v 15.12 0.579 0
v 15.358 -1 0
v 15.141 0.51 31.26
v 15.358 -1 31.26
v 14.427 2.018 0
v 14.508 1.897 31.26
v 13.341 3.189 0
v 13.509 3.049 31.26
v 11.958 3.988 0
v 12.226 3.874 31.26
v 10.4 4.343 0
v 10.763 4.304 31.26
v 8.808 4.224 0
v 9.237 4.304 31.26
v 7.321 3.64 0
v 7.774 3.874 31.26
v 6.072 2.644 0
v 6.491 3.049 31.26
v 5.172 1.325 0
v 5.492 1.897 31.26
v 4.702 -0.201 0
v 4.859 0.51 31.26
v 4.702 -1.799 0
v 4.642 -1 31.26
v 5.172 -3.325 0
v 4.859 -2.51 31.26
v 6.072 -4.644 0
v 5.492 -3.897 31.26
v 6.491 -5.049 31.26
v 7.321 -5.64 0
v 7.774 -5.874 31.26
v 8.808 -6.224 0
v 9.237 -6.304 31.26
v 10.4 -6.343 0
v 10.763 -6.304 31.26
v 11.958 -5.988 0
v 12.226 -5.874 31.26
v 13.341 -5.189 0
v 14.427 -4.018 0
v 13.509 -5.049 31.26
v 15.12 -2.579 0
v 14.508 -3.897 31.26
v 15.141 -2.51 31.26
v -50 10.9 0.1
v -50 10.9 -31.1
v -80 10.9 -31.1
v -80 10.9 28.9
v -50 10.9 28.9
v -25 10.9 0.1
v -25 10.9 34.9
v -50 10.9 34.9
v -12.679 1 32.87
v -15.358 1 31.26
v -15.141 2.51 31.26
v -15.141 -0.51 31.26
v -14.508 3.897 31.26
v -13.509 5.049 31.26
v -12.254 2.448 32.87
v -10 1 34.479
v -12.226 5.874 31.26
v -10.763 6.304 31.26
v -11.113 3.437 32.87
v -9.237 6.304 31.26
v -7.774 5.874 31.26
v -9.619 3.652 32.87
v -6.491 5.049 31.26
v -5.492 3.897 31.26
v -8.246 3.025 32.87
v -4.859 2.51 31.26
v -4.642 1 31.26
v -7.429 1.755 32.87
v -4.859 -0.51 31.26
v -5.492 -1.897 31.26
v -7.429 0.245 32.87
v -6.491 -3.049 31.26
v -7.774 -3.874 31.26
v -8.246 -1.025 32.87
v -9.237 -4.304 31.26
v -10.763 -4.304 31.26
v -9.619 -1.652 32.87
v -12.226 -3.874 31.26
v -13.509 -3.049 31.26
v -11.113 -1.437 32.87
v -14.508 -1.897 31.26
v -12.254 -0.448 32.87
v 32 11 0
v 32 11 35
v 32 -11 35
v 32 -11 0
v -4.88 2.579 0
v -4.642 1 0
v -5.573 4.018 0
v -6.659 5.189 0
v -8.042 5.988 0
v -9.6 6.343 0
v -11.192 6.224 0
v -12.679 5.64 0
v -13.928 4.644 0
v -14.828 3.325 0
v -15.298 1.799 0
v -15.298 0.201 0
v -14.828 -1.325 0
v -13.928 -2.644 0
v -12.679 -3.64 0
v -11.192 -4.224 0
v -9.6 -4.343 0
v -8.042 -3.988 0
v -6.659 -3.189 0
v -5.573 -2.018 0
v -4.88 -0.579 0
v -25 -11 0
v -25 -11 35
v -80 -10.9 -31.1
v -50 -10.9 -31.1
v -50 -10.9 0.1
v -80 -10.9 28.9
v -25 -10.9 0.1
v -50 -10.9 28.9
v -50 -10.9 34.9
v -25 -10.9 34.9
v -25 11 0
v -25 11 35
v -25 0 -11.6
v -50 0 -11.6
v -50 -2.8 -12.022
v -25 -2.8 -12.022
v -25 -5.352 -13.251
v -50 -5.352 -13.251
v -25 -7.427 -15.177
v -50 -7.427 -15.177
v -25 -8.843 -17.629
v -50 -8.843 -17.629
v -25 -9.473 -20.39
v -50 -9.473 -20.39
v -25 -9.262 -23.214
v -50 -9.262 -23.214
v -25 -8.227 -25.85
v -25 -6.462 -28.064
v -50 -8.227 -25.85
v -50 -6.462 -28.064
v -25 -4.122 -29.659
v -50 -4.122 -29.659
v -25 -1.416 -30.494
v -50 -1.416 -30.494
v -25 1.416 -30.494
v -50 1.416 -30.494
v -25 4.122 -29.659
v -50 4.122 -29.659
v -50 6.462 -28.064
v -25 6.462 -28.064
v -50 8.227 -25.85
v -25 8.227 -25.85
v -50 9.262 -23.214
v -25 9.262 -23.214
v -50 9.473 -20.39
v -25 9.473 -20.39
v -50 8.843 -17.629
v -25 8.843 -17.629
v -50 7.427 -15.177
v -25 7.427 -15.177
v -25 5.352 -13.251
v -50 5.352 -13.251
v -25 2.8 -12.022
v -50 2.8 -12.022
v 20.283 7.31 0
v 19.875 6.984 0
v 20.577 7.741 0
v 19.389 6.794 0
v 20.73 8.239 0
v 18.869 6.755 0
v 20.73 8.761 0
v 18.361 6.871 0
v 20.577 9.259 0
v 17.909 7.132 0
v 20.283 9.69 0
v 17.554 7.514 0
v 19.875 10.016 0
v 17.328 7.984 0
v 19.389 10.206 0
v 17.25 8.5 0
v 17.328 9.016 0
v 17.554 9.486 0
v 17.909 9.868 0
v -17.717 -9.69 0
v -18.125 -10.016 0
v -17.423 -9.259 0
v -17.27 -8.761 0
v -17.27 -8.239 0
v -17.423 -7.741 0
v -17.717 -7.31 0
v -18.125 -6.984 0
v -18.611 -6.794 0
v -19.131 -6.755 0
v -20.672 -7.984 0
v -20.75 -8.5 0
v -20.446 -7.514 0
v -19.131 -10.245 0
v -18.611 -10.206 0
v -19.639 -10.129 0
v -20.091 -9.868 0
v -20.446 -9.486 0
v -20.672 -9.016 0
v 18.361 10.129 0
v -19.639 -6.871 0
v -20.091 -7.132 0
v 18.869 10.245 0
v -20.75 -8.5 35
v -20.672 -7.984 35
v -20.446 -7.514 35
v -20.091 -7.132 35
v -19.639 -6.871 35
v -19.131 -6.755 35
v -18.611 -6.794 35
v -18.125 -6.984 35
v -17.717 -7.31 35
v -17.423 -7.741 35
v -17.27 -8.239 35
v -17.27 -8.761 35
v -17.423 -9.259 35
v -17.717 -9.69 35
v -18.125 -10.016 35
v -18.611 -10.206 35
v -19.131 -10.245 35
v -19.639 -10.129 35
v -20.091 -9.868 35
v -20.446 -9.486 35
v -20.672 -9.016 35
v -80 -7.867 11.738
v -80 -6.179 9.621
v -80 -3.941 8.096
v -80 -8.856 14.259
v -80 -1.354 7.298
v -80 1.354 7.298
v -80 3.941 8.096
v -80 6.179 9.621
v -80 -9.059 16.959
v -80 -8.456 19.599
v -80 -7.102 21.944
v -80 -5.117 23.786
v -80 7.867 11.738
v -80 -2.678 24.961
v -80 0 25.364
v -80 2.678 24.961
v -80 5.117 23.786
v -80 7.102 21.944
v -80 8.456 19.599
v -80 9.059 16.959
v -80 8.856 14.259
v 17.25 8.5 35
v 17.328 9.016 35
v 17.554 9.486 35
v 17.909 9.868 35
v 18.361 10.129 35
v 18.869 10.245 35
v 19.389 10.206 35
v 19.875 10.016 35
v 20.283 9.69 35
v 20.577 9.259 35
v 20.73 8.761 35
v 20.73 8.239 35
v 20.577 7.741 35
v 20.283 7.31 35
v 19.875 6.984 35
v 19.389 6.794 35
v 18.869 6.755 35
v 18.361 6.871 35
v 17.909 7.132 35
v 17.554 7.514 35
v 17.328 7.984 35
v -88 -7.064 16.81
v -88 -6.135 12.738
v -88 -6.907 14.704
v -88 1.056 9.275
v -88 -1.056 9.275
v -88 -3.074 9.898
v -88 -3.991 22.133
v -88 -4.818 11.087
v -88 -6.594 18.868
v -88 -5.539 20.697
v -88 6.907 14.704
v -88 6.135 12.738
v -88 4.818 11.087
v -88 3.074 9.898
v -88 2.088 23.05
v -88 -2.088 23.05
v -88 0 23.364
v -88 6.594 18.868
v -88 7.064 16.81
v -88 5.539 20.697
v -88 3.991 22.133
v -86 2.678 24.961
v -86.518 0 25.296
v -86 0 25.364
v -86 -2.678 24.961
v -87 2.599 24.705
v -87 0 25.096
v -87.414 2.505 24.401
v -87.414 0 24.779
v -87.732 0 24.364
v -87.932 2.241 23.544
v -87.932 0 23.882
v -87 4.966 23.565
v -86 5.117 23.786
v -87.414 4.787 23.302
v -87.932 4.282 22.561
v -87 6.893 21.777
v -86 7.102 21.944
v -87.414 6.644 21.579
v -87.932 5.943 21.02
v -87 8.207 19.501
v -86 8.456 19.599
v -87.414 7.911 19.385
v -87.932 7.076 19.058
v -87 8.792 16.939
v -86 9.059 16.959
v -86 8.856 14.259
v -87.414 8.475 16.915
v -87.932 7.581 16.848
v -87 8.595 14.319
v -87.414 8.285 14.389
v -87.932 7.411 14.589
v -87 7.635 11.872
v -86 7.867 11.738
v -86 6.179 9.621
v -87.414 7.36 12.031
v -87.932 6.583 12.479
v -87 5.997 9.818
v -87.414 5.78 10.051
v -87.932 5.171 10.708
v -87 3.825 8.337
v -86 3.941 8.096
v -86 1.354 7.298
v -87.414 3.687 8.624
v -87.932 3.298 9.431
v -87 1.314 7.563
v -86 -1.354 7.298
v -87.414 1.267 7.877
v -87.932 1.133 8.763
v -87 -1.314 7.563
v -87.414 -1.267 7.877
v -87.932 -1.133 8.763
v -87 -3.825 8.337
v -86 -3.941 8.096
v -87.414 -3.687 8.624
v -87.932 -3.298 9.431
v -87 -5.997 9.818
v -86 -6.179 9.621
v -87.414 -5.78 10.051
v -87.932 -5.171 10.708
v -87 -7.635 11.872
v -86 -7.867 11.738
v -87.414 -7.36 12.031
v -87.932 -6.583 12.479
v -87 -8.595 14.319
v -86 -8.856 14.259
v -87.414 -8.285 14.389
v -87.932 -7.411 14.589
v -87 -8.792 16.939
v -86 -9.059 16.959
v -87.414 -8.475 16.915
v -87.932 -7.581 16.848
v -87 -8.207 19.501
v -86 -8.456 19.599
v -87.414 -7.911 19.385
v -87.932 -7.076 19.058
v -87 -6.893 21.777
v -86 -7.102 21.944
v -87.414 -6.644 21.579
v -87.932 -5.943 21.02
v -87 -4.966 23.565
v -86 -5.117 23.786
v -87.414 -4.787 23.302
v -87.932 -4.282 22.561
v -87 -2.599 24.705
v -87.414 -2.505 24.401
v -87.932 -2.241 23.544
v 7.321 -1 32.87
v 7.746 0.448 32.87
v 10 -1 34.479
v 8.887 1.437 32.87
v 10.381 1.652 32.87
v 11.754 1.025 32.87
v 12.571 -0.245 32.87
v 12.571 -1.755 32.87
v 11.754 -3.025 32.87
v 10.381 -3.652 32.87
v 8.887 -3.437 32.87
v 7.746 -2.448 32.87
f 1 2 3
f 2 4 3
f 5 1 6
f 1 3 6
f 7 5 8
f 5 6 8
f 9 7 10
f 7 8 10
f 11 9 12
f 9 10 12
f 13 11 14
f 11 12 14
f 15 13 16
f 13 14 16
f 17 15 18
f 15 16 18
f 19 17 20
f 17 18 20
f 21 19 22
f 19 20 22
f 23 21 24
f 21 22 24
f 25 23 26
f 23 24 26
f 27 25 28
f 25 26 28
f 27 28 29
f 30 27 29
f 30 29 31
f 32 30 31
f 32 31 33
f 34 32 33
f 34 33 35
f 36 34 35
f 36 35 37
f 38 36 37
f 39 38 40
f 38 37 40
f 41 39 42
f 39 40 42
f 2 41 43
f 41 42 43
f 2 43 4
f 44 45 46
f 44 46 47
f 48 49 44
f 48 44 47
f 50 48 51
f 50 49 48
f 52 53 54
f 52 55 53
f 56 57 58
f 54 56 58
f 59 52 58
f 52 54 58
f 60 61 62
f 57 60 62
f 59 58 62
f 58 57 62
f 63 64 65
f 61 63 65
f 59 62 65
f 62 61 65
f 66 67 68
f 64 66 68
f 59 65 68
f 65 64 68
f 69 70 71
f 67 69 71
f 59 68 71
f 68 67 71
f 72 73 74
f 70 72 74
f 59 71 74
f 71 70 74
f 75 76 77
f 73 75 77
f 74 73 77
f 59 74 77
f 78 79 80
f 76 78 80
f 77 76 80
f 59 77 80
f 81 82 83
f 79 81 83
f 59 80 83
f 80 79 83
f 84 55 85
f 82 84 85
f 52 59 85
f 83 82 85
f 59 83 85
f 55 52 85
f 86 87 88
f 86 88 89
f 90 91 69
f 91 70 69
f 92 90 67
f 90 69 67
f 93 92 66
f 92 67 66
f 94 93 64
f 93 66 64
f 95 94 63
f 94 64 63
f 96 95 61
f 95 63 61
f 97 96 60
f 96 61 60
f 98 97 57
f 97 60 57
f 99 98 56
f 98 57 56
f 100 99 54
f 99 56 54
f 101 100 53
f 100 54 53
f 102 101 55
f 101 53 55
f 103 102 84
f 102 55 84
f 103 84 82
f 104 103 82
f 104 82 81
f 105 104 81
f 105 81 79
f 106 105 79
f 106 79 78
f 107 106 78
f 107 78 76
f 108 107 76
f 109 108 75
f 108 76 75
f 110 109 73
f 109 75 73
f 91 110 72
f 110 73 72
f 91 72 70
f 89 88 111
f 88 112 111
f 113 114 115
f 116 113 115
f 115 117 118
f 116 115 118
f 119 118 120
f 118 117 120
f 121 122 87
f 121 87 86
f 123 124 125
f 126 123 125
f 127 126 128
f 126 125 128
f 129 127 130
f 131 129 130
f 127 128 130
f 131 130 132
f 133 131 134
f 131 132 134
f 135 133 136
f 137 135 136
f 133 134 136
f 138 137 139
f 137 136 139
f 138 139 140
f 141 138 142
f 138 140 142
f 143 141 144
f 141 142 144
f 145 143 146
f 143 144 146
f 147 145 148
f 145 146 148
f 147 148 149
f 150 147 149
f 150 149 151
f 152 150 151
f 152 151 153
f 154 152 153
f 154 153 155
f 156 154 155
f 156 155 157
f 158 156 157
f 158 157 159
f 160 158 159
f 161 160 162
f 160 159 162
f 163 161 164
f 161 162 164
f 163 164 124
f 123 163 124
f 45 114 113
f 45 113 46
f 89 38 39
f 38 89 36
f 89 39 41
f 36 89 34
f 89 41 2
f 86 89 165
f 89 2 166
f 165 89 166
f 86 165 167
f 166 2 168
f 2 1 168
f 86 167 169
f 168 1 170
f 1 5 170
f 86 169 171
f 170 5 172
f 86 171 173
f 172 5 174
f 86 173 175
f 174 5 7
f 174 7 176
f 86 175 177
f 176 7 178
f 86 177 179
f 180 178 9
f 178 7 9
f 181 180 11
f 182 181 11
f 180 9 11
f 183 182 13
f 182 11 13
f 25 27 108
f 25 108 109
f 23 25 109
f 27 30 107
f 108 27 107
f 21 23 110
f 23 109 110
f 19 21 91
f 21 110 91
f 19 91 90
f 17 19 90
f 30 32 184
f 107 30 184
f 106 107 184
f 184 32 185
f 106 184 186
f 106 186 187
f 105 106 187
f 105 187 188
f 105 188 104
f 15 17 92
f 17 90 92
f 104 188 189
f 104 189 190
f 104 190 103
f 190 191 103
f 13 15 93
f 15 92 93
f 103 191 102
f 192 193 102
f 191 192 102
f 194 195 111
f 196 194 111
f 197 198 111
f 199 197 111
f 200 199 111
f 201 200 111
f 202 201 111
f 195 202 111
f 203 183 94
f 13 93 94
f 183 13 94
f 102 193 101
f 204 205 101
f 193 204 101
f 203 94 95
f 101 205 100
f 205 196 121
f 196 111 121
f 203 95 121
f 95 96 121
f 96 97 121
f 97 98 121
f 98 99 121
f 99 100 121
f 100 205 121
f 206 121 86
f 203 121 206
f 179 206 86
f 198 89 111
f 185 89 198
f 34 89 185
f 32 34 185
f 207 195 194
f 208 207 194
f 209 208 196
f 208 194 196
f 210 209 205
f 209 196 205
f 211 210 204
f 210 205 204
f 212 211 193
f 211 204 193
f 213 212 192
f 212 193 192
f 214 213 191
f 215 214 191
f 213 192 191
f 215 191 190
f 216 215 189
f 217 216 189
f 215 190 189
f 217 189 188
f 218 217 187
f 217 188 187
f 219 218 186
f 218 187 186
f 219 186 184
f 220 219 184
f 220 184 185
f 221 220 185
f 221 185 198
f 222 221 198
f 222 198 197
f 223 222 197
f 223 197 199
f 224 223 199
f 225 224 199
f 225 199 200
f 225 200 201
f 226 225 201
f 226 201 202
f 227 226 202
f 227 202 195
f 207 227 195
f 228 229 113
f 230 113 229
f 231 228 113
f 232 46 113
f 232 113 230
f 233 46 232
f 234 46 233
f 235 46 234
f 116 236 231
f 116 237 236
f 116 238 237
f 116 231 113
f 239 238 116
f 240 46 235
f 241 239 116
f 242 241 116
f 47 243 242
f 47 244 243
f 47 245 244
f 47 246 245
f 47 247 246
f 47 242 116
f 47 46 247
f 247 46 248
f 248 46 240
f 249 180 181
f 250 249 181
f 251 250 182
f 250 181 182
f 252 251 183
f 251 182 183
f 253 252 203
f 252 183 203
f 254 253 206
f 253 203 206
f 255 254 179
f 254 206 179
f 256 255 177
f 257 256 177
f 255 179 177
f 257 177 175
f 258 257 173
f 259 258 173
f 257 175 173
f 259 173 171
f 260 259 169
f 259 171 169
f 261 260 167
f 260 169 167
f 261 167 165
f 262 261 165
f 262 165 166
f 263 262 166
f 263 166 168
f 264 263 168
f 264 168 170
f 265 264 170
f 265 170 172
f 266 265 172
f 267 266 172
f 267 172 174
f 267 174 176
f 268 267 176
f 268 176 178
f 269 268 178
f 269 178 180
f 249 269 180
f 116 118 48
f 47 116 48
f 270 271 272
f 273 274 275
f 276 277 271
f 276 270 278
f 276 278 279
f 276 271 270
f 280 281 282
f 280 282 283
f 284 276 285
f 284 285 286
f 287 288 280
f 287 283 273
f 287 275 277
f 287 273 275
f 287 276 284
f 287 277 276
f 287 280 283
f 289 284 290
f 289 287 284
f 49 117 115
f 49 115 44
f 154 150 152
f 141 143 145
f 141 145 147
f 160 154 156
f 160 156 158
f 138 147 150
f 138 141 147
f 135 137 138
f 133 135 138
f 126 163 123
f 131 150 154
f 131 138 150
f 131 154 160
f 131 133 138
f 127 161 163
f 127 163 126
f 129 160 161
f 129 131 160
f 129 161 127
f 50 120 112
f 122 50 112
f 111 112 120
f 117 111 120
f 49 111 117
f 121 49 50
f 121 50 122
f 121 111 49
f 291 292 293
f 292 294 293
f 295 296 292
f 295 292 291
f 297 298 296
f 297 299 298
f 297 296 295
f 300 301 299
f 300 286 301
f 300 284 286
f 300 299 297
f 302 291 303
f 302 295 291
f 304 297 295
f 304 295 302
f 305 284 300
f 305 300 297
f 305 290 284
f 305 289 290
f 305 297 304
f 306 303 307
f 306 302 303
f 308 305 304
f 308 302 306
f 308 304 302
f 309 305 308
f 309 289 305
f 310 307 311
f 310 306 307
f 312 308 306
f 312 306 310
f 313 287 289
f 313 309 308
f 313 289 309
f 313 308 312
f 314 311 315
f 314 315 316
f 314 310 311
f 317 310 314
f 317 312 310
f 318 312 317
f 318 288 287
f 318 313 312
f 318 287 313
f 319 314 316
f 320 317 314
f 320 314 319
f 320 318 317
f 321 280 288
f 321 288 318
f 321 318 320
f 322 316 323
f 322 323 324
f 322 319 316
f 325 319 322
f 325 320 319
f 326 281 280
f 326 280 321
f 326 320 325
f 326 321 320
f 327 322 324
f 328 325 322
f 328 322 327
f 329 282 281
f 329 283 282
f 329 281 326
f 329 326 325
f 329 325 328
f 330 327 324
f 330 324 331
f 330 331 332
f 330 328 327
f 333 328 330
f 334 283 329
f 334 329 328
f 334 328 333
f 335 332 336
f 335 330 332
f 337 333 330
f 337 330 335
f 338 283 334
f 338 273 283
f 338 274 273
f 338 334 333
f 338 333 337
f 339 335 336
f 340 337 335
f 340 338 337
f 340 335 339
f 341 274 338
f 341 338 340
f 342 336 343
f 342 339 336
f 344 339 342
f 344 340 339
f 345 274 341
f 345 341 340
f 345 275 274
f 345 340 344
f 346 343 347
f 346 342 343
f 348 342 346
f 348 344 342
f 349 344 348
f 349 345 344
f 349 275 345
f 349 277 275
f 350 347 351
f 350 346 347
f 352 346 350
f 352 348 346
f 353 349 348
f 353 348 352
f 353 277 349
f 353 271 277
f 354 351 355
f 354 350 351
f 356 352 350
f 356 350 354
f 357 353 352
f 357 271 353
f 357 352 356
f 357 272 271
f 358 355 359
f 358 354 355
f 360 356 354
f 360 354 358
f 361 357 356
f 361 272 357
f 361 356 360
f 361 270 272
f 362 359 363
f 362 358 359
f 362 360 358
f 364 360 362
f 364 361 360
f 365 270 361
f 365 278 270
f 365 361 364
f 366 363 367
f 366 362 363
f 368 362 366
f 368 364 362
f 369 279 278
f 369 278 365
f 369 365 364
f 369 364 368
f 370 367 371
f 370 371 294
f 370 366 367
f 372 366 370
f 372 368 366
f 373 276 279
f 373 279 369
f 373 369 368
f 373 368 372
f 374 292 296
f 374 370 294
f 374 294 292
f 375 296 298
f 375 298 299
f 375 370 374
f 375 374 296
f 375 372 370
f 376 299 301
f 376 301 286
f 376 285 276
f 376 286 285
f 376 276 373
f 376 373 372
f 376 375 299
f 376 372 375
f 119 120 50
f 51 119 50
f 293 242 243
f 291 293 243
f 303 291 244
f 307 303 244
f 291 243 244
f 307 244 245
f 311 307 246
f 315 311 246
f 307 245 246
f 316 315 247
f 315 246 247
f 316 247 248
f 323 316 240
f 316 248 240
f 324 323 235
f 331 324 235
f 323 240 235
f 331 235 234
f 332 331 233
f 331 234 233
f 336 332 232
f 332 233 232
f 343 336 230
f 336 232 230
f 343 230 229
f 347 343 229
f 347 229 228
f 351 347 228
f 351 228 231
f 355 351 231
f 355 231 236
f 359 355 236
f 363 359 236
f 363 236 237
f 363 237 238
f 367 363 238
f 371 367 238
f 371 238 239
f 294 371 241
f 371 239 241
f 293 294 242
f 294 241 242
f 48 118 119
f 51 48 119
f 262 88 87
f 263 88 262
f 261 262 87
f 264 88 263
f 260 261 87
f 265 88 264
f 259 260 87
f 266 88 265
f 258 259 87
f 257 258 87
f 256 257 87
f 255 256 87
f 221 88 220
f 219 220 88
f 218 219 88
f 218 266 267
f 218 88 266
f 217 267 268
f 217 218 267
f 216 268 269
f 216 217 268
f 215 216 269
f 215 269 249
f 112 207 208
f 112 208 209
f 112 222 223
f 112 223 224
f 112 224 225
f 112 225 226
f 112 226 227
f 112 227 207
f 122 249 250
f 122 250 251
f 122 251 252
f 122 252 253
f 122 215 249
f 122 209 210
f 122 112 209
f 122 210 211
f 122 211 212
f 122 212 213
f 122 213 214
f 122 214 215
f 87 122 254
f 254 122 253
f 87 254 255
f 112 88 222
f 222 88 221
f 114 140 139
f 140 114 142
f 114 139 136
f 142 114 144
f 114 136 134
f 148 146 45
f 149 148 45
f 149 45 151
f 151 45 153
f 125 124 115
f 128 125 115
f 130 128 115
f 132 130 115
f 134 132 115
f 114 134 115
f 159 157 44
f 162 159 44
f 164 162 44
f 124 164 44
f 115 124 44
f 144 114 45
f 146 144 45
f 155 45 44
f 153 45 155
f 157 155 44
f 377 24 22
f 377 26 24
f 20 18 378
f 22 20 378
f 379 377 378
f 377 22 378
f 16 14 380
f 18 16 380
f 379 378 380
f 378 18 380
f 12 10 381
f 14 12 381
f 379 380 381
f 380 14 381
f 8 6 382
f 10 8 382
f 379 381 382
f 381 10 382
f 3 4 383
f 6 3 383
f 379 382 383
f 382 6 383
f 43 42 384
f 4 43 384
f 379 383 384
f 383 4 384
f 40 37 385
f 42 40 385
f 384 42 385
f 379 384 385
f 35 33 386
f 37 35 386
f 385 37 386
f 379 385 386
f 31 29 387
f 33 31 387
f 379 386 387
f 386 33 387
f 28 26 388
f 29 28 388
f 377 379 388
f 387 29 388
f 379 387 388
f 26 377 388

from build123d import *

# Parameters (mm, degrees)
SKETCH_1_W                 = 50
SKETCH_1_H                 = 22
EXTRUDE_1_DEPTH            = 35
SKETCH_2_R                 = 1.27968475
SKETCH_2_R_2               = 1.164740644
CUT_EXTRUDE_1_DEPTH        = 10
HOLE_WIZARD_1_2_13_1_D     = 10.71626
HOLE_WIZARD_1_2_13_1_DEPTH = 31.26
HOLE_WIZARD_1_2_13_1_TIP   = 3.219489309
CUT_EXTRUDE_2_REACH        = 46.396
SKETCH_5_R                 = 1.75
SKETCH_6_W                 = 35
SKETCH_6_H                 = 22
EXTRUDE_3_DEPTH            = 7
SKETCH_7_W                 = 34.8
SKETCH_7_H                 = 21.8
EXTRUDE_4_DEPTH            = 25
SKETCH_8_W                 = 60
SKETCH_8_H                 = 21.8
EXTRUDE_5_DEPTH            = 30
SKETCH_9_R                 = 9.5
EXTRUDE_6_DEPTH            = 25
SKETCH_10_R                = 9.084139512
EXTRUDE_7_DEPTH            = 8
FILLET_1_R                 = 2


with BuildPart() as part:
    # 草图1 → 凸台-拉伸1 (new body)
    with BuildSketch(Plane.XY):
        Rectangle(SKETCH_1_W, SKETCH_1_H)
    extrude(amount=EXTRUDE_1_DEPTH)

    # 草图2 → 切除-拉伸1 (cut)
    with BuildSketch(Plane(origin=(0, 0, 0), x_dir=(-1, 0, 0), z_dir=(0, 0, -1))):
        with Locations((-10, -1)):
            Circle(SKETCH_2_R)
        with Locations((10, 1)):
            Circle(SKETCH_2_R_2)
    extrude(amount=-CUT_EXTRUDE_1_DEPTH, mode=Mode.SUBTRACT)

    # 1/2-13 螺纹孔1
    with Locations(Plane(origin=(0, 0, 0), x_dir=(-1, 0, 0), z_dir=(0, 0, -1))):
        with Locations((10, 1), (-10, -1)):
            Hole(HOLE_WIZARD_1_2_13_1_D / 2, depth=HOLE_WIZARD_1_2_13_1_DEPTH)
            with Locations((0, 0, -(HOLE_WIZARD_1_2_13_1_DEPTH + HOLE_WIZARD_1_2_13_1_TIP / 2))):  # 118° drill point
                Cone(0, HOLE_WIZARD_1_2_13_1_D / 2, HOLE_WIZARD_1_2_13_1_TIP, mode=Mode.SUBTRACT)

    # 草图5 → 切除-拉伸2 (cut, up to next)
    with BuildSketch(Plane(origin=(0, 0, 0), x_dir=(-1, 0, 0), z_dir=(0, 0, -1)), mode=Mode.PRIVATE) as cut_extrude_2_sk1:
        with Locations((-19, 8.5)):
            Circle(SKETCH_5_R)
    cut_extrude_2_tool1 = extrude(cut_extrude_2_sk1.sketch, amount=-CUT_EXTRUDE_2_REACH, mode=Mode.PRIVATE) & part.part
    # 草图5 → 切除-拉伸2 (cut, up to next)
    with BuildSketch(Plane(origin=(0, 0, 0), x_dir=(-1, 0, 0), z_dir=(0, 0, -1)), mode=Mode.PRIVATE) as cut_extrude_2_sk2:
        with Locations((19, -8.5)):
            Circle(SKETCH_5_R)
    cut_extrude_2_tool2 = extrude(cut_extrude_2_sk2.sketch, amount=-CUT_EXTRUDE_2_REACH, mode=Mode.PRIVATE) & part.part
    add(cut_extrude_2_tool1.solids().sort_by_distance((19, 8.5, 0))[0], mode=Mode.SUBTRACT)
    add(cut_extrude_2_tool2.solids().sort_by_distance((-19, -8.5, 0))[0], mode=Mode.SUBTRACT)

    # 草图6 → 凸台-拉伸3 (add)
    with BuildSketch(Plane(origin=(25, 0, 0), x_dir=(0, 0, -1), z_dir=(1, 0, 0))):
        with Locations((-17.5, 0)):
            Rectangle(SKETCH_6_W, SKETCH_6_H)
    extrude(amount=EXTRUDE_3_DEPTH)

    # 草图7 → 凸台-拉伸4 (add)
    with BuildSketch(Plane.ZY.offset(25)):
        with Locations((17.5, 0)):
            Rectangle(SKETCH_7_W, SKETCH_7_H)
    extrude(amount=EXTRUDE_4_DEPTH)

    # 草图8 → 凸台-拉伸5 (add)
    with BuildSketch(Plane.ZY.offset(50)):
        with Locations((-1.1, 0)):
            Rectangle(SKETCH_8_W, SKETCH_8_H)
    extrude(amount=EXTRUDE_5_DEPTH)

    # 草图9 → 凸台-拉伸6 (add)
    with BuildSketch(Plane(origin=(-50, 0, 0), x_dir=(0, 0, -1), z_dir=(1, 0, 0))):
        with Locations(Location((21.1, 0, 0), (0, 0, 180))):
            Circle(SKETCH_9_R)
    extrude(amount=EXTRUDE_6_DEPTH)

    # 草图10 → 凸台-拉伸7 (add)
    with BuildSketch(Plane.ZY.offset(80)):
        with Locations((16.280298675, 0)):
            Circle(SKETCH_10_R)
    extrude(amount=EXTRUDE_7_DEPTH)

    # 圆角1
    fillet_1_edges = [part.edges().sort_by_distance(p)[0] for p in [
        (-88, 0, 7.196159162),
    ]]
    fillet(fillet_1_edges, radius=FILLET_1_R)


solid = part.part
